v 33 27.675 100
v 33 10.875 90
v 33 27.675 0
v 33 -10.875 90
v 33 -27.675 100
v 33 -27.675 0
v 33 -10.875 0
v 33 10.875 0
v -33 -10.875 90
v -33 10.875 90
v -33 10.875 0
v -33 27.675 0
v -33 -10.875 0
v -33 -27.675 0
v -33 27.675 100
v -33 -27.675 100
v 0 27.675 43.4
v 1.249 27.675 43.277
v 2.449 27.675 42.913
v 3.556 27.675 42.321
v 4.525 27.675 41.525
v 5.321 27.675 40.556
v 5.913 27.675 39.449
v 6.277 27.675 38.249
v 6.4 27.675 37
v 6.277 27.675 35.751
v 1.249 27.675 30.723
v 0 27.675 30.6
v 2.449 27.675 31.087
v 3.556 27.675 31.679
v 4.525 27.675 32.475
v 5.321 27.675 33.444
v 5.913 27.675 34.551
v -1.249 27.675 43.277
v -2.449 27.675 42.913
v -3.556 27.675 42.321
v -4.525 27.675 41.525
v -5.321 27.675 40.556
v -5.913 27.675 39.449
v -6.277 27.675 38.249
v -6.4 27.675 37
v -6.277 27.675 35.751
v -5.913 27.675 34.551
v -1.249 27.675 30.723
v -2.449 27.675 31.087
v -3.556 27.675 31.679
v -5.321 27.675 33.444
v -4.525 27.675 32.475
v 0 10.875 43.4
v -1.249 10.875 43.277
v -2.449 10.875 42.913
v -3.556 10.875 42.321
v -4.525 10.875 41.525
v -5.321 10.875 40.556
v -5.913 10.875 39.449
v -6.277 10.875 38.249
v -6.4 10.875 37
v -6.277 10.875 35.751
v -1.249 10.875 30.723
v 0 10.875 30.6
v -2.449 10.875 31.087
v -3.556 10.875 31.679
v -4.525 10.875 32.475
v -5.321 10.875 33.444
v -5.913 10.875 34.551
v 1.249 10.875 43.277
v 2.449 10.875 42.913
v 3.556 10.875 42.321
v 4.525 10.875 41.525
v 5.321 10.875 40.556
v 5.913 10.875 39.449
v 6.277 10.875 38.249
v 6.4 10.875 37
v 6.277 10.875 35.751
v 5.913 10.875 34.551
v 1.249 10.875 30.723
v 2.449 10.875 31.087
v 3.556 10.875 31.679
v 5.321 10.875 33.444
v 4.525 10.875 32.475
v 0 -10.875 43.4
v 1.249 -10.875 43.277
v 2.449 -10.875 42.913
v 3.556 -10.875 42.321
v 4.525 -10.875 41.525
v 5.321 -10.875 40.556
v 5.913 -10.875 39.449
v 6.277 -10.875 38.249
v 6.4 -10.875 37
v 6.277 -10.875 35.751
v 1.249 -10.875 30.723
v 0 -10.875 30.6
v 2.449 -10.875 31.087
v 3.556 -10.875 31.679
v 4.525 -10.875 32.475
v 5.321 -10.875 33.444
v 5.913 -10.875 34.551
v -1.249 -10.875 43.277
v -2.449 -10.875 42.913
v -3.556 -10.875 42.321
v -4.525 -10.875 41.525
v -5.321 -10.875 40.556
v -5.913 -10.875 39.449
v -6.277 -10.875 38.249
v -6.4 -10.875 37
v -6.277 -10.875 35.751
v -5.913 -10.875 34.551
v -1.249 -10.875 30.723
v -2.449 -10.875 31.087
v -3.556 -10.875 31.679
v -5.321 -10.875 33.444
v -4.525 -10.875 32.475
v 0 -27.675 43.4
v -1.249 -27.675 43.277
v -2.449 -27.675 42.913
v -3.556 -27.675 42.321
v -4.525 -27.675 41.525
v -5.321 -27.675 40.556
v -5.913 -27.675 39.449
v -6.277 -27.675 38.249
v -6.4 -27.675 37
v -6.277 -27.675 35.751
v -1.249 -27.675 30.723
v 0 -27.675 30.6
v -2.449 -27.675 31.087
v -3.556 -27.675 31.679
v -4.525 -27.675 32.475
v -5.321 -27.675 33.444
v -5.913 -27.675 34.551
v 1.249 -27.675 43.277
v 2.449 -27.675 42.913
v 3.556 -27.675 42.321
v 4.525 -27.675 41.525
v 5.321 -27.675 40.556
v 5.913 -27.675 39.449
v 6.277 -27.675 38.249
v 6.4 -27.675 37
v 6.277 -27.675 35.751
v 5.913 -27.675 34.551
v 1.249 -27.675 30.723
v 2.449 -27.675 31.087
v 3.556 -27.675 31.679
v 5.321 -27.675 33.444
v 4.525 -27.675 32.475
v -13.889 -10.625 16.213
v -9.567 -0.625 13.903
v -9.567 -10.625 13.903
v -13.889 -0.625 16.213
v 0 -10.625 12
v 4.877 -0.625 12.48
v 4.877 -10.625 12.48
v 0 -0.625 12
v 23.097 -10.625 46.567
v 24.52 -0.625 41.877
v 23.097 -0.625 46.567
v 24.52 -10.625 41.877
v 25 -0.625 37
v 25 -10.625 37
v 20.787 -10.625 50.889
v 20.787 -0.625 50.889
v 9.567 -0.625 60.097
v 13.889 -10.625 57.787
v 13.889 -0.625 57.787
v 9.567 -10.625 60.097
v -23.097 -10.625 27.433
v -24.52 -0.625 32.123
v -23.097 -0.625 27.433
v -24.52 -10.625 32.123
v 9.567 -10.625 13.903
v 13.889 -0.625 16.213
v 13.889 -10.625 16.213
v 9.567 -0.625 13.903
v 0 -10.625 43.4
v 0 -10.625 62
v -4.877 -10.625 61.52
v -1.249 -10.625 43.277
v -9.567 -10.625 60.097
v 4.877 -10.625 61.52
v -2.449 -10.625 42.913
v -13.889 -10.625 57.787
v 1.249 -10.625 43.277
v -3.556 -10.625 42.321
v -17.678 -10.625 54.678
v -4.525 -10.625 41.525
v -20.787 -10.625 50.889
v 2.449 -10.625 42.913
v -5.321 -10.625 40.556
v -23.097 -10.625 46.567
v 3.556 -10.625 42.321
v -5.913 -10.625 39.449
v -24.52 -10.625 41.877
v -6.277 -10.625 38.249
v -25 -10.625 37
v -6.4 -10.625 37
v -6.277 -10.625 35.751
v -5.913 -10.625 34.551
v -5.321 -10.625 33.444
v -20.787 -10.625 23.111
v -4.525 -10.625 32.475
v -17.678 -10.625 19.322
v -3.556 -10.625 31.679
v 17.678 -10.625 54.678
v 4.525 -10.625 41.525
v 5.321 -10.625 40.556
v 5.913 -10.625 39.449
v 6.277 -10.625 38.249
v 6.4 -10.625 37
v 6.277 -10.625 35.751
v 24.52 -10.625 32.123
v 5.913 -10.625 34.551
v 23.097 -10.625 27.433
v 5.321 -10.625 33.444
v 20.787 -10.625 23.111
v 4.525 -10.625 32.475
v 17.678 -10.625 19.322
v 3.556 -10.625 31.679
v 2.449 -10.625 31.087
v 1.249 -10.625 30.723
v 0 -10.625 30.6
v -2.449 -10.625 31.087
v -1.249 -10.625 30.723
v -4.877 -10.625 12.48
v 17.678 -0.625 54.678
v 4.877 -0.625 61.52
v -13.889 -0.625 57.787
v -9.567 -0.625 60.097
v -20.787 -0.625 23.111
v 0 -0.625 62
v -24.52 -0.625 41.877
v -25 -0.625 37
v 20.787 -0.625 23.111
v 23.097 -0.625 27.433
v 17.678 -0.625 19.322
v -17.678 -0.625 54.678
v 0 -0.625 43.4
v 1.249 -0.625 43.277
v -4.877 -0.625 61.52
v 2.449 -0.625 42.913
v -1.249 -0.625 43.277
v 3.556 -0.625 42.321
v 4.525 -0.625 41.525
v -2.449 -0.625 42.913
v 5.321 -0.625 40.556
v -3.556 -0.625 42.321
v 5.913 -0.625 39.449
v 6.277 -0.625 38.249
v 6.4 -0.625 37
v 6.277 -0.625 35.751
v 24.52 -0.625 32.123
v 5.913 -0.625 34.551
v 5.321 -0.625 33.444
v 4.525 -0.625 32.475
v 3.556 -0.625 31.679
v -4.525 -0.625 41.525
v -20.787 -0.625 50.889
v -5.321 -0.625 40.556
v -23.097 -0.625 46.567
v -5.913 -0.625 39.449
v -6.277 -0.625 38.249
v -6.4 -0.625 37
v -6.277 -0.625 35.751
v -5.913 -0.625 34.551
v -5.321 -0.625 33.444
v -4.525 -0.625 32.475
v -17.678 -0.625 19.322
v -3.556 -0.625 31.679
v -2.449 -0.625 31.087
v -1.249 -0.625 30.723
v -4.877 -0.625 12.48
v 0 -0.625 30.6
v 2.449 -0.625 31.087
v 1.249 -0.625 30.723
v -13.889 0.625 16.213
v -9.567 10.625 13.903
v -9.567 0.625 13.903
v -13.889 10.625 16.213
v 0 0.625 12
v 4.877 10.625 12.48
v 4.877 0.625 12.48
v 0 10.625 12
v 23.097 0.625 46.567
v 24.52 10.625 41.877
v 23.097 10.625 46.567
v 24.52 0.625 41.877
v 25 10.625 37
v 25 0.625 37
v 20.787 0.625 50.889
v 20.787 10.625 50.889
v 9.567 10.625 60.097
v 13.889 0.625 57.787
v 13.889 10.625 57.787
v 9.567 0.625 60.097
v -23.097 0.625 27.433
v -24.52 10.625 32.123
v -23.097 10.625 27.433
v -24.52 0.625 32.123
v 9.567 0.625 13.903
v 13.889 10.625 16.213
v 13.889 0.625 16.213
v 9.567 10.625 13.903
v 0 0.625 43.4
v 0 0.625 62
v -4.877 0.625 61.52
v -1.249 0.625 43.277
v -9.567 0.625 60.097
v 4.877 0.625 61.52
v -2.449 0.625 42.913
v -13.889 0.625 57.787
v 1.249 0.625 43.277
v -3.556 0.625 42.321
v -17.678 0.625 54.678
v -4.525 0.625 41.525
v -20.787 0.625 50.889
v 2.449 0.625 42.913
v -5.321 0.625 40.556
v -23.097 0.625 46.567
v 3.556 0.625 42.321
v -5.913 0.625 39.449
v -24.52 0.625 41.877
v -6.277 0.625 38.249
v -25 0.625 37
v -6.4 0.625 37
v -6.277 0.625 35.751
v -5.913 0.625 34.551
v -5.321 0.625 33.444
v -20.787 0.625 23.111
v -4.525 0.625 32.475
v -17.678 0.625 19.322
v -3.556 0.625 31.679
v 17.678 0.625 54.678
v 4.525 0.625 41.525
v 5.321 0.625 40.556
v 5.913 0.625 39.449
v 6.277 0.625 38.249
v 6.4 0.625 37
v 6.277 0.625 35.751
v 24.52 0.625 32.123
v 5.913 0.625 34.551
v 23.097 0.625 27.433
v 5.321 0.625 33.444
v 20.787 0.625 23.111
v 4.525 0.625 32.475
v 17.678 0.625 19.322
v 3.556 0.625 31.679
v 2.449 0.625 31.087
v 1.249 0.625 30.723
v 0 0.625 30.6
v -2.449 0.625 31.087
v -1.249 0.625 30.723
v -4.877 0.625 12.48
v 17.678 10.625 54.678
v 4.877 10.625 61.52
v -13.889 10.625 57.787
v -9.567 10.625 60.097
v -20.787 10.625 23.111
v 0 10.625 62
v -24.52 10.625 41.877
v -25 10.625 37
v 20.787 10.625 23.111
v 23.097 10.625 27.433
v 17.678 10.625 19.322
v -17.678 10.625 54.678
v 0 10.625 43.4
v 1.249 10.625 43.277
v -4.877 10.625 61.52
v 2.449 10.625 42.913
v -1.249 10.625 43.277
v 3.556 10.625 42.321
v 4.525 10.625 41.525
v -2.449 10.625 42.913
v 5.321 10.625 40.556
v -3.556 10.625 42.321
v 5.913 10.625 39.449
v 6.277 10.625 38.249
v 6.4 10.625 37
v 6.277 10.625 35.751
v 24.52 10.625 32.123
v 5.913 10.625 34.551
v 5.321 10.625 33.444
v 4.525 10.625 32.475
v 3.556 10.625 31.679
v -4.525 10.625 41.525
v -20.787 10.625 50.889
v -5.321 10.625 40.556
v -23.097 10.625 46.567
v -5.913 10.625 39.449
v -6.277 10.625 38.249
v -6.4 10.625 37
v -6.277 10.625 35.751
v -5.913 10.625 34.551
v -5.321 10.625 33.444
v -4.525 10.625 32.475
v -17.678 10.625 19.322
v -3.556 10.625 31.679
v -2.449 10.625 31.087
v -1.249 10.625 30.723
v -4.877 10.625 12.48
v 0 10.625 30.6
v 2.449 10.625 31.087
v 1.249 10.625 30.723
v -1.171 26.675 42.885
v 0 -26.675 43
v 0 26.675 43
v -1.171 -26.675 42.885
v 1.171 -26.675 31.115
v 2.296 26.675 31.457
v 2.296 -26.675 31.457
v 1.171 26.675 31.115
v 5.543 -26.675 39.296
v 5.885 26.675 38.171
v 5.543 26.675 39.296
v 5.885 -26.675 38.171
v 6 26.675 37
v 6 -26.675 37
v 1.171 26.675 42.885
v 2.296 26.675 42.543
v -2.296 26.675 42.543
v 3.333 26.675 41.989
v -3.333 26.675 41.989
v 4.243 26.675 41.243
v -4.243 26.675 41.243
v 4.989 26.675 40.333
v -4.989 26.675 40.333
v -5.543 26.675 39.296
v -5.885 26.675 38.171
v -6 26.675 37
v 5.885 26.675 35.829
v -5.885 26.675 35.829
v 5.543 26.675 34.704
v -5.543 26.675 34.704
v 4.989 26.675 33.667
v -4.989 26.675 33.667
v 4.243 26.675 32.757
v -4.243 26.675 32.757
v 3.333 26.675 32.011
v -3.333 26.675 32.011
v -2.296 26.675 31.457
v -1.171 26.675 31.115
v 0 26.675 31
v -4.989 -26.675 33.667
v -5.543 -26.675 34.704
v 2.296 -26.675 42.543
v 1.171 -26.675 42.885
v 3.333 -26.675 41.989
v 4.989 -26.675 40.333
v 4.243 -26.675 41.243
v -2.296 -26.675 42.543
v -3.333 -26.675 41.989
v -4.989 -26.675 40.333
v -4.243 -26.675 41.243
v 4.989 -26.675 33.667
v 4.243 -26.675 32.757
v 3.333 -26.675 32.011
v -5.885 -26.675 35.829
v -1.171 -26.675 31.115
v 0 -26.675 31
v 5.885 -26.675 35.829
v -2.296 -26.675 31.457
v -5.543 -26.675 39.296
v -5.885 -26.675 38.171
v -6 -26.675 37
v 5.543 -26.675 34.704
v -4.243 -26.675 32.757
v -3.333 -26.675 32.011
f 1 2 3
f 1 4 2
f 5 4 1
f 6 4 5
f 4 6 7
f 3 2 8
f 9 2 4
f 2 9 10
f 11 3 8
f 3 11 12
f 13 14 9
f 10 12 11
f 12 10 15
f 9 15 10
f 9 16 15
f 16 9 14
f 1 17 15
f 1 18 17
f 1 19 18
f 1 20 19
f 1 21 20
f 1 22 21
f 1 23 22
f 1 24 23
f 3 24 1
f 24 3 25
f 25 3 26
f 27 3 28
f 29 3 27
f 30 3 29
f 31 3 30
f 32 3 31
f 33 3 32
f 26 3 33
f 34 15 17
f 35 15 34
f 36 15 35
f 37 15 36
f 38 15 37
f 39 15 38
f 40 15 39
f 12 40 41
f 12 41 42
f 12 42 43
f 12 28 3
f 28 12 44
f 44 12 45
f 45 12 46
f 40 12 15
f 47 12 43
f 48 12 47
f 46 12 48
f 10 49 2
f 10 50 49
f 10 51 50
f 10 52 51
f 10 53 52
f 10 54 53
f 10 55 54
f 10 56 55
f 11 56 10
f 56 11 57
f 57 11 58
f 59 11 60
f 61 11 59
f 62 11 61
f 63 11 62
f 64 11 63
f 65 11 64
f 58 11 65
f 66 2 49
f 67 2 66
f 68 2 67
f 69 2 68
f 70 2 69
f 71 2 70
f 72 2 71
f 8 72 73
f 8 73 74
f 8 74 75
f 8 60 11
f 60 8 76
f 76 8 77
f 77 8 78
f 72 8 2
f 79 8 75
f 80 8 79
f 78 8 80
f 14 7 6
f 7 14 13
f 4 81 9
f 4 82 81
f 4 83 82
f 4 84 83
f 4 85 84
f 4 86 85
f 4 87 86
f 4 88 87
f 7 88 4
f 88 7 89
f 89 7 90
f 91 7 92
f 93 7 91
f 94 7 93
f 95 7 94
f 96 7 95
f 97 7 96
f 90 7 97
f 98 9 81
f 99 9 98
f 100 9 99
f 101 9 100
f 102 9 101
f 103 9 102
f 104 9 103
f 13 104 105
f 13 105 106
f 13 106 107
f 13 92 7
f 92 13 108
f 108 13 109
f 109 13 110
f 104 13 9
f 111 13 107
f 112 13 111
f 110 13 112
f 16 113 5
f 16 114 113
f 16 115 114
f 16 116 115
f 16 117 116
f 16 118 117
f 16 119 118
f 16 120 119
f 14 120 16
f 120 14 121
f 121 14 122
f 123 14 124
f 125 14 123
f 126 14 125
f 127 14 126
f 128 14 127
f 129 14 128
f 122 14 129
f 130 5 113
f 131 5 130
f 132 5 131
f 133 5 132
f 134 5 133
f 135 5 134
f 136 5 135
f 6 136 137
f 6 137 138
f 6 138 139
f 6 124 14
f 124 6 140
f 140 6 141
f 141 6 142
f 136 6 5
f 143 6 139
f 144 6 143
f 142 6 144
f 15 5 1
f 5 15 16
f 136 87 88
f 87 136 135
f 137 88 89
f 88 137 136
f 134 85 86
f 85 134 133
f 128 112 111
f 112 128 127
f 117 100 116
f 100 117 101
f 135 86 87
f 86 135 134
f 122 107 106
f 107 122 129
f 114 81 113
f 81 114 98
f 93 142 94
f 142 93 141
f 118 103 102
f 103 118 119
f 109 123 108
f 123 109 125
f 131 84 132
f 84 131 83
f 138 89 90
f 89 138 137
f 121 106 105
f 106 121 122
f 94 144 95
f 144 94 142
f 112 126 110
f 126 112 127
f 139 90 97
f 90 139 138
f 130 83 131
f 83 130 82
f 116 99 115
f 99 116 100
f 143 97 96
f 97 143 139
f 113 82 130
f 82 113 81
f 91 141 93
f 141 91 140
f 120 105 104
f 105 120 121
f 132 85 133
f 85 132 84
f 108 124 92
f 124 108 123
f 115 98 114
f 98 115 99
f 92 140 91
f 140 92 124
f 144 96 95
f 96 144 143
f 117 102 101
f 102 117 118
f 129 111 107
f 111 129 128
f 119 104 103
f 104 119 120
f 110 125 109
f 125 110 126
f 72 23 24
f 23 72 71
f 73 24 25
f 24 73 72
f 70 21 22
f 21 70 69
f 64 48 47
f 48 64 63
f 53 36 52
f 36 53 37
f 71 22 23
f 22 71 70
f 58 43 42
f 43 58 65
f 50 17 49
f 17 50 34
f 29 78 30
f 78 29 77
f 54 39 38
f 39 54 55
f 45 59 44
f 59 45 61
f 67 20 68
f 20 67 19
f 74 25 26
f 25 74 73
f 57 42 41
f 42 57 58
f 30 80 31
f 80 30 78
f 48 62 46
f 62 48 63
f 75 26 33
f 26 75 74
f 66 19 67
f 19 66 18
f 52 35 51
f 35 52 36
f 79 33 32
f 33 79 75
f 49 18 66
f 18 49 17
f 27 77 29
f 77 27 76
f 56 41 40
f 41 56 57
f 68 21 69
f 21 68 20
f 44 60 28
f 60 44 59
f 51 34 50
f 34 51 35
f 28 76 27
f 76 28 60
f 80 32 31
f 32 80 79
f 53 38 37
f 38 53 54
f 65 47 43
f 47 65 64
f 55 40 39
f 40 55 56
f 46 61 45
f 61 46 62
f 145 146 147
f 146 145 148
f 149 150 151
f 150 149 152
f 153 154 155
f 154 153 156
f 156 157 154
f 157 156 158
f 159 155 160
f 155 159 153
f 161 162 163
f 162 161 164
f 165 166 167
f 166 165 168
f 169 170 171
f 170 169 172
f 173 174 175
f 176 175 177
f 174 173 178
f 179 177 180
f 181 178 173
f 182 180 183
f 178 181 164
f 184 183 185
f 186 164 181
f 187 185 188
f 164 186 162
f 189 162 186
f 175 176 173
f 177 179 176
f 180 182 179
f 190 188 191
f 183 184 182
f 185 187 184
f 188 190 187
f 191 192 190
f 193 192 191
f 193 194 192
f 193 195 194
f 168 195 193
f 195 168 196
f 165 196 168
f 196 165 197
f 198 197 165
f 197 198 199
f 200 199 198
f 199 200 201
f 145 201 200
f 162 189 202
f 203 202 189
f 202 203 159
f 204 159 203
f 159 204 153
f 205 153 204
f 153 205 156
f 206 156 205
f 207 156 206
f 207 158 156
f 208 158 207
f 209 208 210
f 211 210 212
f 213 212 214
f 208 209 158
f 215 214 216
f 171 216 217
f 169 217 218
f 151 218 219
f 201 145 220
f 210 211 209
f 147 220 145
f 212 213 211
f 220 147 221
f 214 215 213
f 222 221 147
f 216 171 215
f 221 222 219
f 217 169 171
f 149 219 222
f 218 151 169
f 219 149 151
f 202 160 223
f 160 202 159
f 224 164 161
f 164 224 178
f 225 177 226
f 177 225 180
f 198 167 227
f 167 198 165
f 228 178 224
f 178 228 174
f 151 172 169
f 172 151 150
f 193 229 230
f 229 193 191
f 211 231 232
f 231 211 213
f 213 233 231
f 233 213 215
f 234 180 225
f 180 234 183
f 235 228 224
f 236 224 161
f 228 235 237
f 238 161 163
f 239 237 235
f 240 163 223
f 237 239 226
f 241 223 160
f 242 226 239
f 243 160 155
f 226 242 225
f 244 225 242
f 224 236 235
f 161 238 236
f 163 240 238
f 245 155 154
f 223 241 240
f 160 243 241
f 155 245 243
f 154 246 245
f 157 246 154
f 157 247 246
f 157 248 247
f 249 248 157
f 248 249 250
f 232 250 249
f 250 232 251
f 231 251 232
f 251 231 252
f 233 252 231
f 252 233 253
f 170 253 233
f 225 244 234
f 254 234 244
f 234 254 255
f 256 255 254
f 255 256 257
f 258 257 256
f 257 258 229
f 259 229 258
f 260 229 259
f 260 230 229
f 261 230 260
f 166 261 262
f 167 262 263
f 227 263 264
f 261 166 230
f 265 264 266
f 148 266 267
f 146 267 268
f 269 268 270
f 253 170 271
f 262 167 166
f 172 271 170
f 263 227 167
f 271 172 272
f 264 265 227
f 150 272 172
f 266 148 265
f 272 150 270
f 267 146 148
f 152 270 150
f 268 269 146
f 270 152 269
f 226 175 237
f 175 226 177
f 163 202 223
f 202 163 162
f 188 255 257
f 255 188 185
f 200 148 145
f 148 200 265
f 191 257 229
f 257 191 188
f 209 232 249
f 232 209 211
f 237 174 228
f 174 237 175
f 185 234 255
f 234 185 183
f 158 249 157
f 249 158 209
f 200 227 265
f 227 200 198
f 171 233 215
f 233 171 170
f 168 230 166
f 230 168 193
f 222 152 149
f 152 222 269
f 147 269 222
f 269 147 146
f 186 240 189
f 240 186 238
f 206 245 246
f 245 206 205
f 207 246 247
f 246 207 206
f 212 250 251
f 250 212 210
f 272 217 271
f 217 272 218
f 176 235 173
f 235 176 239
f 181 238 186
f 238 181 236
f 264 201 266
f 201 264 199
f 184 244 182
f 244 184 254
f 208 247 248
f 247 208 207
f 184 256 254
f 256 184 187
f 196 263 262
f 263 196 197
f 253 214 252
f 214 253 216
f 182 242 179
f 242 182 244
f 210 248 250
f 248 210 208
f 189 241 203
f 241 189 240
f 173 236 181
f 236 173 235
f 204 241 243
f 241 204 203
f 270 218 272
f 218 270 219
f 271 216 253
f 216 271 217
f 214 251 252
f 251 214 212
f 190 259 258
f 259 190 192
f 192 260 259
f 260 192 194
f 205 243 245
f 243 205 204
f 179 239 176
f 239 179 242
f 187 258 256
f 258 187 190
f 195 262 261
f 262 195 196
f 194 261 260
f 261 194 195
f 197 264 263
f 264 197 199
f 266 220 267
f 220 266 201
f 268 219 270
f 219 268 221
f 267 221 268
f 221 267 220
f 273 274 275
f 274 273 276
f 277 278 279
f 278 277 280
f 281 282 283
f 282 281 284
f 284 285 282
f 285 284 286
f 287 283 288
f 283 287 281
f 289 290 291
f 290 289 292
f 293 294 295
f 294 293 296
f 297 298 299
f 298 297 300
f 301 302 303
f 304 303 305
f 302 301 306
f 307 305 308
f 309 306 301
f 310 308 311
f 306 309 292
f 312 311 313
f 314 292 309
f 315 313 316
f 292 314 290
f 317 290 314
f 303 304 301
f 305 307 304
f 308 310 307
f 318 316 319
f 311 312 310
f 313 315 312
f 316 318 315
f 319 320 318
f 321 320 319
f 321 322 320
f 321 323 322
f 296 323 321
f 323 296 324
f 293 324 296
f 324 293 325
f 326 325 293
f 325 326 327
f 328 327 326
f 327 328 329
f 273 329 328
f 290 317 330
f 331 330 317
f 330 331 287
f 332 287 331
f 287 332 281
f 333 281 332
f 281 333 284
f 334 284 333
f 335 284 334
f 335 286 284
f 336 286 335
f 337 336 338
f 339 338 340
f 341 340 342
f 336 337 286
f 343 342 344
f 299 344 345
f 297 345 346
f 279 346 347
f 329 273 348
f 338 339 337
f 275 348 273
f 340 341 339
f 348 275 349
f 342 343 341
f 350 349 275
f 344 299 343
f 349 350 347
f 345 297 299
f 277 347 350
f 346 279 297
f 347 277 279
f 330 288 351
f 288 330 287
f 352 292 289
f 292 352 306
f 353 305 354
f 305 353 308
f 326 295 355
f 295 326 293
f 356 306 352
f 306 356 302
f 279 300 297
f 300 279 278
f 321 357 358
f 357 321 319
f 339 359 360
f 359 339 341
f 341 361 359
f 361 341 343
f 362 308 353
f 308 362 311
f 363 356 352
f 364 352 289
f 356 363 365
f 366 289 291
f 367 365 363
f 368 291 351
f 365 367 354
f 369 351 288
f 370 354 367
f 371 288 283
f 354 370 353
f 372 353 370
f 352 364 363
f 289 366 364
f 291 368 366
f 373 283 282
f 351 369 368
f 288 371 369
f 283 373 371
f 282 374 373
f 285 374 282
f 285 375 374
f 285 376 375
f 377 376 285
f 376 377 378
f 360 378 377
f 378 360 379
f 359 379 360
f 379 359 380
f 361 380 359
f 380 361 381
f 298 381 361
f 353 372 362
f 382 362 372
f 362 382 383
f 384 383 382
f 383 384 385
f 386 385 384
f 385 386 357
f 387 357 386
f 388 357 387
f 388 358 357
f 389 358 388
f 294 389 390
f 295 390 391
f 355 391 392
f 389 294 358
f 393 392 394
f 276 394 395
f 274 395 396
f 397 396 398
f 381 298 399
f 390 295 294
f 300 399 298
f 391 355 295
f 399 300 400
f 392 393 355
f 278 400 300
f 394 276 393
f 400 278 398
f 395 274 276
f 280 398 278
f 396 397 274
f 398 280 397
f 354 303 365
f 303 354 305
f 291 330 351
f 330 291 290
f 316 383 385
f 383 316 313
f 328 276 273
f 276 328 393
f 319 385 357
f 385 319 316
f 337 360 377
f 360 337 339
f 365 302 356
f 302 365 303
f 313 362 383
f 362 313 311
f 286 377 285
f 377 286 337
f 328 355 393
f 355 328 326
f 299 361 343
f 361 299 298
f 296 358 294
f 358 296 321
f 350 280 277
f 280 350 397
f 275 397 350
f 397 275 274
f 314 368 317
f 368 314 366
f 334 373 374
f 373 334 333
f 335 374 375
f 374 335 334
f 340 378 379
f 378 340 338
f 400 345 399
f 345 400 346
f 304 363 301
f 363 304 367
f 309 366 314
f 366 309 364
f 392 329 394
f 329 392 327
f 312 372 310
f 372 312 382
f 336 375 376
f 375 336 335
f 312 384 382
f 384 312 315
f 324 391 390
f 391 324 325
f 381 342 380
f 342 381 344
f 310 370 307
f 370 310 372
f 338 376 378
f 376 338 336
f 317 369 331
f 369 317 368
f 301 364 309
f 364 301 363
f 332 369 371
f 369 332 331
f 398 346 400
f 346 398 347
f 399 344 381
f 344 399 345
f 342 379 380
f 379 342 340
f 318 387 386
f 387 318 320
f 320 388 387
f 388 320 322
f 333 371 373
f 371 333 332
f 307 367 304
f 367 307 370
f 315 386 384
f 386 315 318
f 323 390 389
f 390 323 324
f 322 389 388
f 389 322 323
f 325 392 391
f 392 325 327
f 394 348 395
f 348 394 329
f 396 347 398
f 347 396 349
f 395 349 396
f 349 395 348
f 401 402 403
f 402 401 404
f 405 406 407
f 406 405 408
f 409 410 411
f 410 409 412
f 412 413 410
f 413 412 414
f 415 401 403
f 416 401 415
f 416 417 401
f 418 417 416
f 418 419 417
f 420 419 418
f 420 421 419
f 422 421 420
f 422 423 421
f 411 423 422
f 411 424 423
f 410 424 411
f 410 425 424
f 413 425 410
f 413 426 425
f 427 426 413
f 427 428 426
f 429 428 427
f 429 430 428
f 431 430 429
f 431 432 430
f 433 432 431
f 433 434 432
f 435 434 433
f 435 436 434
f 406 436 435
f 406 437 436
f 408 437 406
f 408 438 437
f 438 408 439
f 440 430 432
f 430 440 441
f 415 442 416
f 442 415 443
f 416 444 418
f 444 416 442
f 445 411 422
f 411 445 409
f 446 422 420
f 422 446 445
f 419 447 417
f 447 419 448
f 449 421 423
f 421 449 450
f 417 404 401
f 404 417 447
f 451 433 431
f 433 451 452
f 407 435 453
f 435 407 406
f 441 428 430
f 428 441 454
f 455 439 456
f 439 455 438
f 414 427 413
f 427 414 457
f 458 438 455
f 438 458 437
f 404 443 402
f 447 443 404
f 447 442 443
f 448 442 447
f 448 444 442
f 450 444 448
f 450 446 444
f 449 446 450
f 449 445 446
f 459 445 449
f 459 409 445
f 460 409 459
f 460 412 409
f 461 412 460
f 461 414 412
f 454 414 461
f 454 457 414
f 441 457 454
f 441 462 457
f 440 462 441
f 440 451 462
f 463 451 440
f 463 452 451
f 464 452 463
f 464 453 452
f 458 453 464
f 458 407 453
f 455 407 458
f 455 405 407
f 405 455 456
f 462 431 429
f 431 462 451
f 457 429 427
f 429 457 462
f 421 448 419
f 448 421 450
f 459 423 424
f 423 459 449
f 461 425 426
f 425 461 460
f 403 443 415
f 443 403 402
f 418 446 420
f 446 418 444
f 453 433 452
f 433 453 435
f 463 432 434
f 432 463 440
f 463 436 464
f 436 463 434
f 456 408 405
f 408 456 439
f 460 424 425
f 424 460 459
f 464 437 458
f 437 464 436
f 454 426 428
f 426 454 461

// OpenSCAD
$fn = 32;

// ------------------------------------------------------------------------
// Trolley wheel set: wheels d50, fork 90 mm tall
// Every part is its own module, assembly() places every instance.
// ------------------------------------------------------------------------

// --- part 1 ---
module trolley_fork() {
  difference() {
    union() {
      translate([-33, 10.875, 0]) cube([66, 16.8, 90]);
      translate([-33, -27.675, 0]) cube([66, 16.8, 90]);
      translate([-33, -27.675, 90]) cube([66, 55.35, 10]);
    }
    translate([0, -19.275, 37]) rotate([90, 0, 0]) cylinder(h = 18.8, d = 12.8, center = true);
    translate([0, 19.275, 37]) rotate([90, 0, 0]) cylinder(h = 18.8, d = 12.8, center = true);
  }
}

// --- part 2 ---
module trolley_wheel() {
  difference() {
      translate([0, 0, 0]) cylinder(h = 10, d = 50);
      translate([0, 0, -1]) cylinder(h = 12, d = 12.8);
    }
}

// --- part 3 ---
module trolley_axle() {
  translate([0, 0, -26.675]) cylinder(h = 53.35, d = 12);
}

// --- assembly ---
module assembly() {
  color([0.80, 0.24, 0.20]) translate([0, 0, 0]) rotate([0, 0, 0]) trolley_fork();
  color([0.20, 0.45, 0.75]) translate([0, -0.625, 37]) rotate([90, 0, 0]) trolley_wheel();
  color([0.25, 0.62, 0.32]) translate([0, 10.625, 37]) rotate([90, 0, 0]) trolley_wheel();
  color([0.92, 0.70, 0.18]) translate([0, 0, 37]) rotate([90, 0, 0]) trolley_axle();
}

assembly();
